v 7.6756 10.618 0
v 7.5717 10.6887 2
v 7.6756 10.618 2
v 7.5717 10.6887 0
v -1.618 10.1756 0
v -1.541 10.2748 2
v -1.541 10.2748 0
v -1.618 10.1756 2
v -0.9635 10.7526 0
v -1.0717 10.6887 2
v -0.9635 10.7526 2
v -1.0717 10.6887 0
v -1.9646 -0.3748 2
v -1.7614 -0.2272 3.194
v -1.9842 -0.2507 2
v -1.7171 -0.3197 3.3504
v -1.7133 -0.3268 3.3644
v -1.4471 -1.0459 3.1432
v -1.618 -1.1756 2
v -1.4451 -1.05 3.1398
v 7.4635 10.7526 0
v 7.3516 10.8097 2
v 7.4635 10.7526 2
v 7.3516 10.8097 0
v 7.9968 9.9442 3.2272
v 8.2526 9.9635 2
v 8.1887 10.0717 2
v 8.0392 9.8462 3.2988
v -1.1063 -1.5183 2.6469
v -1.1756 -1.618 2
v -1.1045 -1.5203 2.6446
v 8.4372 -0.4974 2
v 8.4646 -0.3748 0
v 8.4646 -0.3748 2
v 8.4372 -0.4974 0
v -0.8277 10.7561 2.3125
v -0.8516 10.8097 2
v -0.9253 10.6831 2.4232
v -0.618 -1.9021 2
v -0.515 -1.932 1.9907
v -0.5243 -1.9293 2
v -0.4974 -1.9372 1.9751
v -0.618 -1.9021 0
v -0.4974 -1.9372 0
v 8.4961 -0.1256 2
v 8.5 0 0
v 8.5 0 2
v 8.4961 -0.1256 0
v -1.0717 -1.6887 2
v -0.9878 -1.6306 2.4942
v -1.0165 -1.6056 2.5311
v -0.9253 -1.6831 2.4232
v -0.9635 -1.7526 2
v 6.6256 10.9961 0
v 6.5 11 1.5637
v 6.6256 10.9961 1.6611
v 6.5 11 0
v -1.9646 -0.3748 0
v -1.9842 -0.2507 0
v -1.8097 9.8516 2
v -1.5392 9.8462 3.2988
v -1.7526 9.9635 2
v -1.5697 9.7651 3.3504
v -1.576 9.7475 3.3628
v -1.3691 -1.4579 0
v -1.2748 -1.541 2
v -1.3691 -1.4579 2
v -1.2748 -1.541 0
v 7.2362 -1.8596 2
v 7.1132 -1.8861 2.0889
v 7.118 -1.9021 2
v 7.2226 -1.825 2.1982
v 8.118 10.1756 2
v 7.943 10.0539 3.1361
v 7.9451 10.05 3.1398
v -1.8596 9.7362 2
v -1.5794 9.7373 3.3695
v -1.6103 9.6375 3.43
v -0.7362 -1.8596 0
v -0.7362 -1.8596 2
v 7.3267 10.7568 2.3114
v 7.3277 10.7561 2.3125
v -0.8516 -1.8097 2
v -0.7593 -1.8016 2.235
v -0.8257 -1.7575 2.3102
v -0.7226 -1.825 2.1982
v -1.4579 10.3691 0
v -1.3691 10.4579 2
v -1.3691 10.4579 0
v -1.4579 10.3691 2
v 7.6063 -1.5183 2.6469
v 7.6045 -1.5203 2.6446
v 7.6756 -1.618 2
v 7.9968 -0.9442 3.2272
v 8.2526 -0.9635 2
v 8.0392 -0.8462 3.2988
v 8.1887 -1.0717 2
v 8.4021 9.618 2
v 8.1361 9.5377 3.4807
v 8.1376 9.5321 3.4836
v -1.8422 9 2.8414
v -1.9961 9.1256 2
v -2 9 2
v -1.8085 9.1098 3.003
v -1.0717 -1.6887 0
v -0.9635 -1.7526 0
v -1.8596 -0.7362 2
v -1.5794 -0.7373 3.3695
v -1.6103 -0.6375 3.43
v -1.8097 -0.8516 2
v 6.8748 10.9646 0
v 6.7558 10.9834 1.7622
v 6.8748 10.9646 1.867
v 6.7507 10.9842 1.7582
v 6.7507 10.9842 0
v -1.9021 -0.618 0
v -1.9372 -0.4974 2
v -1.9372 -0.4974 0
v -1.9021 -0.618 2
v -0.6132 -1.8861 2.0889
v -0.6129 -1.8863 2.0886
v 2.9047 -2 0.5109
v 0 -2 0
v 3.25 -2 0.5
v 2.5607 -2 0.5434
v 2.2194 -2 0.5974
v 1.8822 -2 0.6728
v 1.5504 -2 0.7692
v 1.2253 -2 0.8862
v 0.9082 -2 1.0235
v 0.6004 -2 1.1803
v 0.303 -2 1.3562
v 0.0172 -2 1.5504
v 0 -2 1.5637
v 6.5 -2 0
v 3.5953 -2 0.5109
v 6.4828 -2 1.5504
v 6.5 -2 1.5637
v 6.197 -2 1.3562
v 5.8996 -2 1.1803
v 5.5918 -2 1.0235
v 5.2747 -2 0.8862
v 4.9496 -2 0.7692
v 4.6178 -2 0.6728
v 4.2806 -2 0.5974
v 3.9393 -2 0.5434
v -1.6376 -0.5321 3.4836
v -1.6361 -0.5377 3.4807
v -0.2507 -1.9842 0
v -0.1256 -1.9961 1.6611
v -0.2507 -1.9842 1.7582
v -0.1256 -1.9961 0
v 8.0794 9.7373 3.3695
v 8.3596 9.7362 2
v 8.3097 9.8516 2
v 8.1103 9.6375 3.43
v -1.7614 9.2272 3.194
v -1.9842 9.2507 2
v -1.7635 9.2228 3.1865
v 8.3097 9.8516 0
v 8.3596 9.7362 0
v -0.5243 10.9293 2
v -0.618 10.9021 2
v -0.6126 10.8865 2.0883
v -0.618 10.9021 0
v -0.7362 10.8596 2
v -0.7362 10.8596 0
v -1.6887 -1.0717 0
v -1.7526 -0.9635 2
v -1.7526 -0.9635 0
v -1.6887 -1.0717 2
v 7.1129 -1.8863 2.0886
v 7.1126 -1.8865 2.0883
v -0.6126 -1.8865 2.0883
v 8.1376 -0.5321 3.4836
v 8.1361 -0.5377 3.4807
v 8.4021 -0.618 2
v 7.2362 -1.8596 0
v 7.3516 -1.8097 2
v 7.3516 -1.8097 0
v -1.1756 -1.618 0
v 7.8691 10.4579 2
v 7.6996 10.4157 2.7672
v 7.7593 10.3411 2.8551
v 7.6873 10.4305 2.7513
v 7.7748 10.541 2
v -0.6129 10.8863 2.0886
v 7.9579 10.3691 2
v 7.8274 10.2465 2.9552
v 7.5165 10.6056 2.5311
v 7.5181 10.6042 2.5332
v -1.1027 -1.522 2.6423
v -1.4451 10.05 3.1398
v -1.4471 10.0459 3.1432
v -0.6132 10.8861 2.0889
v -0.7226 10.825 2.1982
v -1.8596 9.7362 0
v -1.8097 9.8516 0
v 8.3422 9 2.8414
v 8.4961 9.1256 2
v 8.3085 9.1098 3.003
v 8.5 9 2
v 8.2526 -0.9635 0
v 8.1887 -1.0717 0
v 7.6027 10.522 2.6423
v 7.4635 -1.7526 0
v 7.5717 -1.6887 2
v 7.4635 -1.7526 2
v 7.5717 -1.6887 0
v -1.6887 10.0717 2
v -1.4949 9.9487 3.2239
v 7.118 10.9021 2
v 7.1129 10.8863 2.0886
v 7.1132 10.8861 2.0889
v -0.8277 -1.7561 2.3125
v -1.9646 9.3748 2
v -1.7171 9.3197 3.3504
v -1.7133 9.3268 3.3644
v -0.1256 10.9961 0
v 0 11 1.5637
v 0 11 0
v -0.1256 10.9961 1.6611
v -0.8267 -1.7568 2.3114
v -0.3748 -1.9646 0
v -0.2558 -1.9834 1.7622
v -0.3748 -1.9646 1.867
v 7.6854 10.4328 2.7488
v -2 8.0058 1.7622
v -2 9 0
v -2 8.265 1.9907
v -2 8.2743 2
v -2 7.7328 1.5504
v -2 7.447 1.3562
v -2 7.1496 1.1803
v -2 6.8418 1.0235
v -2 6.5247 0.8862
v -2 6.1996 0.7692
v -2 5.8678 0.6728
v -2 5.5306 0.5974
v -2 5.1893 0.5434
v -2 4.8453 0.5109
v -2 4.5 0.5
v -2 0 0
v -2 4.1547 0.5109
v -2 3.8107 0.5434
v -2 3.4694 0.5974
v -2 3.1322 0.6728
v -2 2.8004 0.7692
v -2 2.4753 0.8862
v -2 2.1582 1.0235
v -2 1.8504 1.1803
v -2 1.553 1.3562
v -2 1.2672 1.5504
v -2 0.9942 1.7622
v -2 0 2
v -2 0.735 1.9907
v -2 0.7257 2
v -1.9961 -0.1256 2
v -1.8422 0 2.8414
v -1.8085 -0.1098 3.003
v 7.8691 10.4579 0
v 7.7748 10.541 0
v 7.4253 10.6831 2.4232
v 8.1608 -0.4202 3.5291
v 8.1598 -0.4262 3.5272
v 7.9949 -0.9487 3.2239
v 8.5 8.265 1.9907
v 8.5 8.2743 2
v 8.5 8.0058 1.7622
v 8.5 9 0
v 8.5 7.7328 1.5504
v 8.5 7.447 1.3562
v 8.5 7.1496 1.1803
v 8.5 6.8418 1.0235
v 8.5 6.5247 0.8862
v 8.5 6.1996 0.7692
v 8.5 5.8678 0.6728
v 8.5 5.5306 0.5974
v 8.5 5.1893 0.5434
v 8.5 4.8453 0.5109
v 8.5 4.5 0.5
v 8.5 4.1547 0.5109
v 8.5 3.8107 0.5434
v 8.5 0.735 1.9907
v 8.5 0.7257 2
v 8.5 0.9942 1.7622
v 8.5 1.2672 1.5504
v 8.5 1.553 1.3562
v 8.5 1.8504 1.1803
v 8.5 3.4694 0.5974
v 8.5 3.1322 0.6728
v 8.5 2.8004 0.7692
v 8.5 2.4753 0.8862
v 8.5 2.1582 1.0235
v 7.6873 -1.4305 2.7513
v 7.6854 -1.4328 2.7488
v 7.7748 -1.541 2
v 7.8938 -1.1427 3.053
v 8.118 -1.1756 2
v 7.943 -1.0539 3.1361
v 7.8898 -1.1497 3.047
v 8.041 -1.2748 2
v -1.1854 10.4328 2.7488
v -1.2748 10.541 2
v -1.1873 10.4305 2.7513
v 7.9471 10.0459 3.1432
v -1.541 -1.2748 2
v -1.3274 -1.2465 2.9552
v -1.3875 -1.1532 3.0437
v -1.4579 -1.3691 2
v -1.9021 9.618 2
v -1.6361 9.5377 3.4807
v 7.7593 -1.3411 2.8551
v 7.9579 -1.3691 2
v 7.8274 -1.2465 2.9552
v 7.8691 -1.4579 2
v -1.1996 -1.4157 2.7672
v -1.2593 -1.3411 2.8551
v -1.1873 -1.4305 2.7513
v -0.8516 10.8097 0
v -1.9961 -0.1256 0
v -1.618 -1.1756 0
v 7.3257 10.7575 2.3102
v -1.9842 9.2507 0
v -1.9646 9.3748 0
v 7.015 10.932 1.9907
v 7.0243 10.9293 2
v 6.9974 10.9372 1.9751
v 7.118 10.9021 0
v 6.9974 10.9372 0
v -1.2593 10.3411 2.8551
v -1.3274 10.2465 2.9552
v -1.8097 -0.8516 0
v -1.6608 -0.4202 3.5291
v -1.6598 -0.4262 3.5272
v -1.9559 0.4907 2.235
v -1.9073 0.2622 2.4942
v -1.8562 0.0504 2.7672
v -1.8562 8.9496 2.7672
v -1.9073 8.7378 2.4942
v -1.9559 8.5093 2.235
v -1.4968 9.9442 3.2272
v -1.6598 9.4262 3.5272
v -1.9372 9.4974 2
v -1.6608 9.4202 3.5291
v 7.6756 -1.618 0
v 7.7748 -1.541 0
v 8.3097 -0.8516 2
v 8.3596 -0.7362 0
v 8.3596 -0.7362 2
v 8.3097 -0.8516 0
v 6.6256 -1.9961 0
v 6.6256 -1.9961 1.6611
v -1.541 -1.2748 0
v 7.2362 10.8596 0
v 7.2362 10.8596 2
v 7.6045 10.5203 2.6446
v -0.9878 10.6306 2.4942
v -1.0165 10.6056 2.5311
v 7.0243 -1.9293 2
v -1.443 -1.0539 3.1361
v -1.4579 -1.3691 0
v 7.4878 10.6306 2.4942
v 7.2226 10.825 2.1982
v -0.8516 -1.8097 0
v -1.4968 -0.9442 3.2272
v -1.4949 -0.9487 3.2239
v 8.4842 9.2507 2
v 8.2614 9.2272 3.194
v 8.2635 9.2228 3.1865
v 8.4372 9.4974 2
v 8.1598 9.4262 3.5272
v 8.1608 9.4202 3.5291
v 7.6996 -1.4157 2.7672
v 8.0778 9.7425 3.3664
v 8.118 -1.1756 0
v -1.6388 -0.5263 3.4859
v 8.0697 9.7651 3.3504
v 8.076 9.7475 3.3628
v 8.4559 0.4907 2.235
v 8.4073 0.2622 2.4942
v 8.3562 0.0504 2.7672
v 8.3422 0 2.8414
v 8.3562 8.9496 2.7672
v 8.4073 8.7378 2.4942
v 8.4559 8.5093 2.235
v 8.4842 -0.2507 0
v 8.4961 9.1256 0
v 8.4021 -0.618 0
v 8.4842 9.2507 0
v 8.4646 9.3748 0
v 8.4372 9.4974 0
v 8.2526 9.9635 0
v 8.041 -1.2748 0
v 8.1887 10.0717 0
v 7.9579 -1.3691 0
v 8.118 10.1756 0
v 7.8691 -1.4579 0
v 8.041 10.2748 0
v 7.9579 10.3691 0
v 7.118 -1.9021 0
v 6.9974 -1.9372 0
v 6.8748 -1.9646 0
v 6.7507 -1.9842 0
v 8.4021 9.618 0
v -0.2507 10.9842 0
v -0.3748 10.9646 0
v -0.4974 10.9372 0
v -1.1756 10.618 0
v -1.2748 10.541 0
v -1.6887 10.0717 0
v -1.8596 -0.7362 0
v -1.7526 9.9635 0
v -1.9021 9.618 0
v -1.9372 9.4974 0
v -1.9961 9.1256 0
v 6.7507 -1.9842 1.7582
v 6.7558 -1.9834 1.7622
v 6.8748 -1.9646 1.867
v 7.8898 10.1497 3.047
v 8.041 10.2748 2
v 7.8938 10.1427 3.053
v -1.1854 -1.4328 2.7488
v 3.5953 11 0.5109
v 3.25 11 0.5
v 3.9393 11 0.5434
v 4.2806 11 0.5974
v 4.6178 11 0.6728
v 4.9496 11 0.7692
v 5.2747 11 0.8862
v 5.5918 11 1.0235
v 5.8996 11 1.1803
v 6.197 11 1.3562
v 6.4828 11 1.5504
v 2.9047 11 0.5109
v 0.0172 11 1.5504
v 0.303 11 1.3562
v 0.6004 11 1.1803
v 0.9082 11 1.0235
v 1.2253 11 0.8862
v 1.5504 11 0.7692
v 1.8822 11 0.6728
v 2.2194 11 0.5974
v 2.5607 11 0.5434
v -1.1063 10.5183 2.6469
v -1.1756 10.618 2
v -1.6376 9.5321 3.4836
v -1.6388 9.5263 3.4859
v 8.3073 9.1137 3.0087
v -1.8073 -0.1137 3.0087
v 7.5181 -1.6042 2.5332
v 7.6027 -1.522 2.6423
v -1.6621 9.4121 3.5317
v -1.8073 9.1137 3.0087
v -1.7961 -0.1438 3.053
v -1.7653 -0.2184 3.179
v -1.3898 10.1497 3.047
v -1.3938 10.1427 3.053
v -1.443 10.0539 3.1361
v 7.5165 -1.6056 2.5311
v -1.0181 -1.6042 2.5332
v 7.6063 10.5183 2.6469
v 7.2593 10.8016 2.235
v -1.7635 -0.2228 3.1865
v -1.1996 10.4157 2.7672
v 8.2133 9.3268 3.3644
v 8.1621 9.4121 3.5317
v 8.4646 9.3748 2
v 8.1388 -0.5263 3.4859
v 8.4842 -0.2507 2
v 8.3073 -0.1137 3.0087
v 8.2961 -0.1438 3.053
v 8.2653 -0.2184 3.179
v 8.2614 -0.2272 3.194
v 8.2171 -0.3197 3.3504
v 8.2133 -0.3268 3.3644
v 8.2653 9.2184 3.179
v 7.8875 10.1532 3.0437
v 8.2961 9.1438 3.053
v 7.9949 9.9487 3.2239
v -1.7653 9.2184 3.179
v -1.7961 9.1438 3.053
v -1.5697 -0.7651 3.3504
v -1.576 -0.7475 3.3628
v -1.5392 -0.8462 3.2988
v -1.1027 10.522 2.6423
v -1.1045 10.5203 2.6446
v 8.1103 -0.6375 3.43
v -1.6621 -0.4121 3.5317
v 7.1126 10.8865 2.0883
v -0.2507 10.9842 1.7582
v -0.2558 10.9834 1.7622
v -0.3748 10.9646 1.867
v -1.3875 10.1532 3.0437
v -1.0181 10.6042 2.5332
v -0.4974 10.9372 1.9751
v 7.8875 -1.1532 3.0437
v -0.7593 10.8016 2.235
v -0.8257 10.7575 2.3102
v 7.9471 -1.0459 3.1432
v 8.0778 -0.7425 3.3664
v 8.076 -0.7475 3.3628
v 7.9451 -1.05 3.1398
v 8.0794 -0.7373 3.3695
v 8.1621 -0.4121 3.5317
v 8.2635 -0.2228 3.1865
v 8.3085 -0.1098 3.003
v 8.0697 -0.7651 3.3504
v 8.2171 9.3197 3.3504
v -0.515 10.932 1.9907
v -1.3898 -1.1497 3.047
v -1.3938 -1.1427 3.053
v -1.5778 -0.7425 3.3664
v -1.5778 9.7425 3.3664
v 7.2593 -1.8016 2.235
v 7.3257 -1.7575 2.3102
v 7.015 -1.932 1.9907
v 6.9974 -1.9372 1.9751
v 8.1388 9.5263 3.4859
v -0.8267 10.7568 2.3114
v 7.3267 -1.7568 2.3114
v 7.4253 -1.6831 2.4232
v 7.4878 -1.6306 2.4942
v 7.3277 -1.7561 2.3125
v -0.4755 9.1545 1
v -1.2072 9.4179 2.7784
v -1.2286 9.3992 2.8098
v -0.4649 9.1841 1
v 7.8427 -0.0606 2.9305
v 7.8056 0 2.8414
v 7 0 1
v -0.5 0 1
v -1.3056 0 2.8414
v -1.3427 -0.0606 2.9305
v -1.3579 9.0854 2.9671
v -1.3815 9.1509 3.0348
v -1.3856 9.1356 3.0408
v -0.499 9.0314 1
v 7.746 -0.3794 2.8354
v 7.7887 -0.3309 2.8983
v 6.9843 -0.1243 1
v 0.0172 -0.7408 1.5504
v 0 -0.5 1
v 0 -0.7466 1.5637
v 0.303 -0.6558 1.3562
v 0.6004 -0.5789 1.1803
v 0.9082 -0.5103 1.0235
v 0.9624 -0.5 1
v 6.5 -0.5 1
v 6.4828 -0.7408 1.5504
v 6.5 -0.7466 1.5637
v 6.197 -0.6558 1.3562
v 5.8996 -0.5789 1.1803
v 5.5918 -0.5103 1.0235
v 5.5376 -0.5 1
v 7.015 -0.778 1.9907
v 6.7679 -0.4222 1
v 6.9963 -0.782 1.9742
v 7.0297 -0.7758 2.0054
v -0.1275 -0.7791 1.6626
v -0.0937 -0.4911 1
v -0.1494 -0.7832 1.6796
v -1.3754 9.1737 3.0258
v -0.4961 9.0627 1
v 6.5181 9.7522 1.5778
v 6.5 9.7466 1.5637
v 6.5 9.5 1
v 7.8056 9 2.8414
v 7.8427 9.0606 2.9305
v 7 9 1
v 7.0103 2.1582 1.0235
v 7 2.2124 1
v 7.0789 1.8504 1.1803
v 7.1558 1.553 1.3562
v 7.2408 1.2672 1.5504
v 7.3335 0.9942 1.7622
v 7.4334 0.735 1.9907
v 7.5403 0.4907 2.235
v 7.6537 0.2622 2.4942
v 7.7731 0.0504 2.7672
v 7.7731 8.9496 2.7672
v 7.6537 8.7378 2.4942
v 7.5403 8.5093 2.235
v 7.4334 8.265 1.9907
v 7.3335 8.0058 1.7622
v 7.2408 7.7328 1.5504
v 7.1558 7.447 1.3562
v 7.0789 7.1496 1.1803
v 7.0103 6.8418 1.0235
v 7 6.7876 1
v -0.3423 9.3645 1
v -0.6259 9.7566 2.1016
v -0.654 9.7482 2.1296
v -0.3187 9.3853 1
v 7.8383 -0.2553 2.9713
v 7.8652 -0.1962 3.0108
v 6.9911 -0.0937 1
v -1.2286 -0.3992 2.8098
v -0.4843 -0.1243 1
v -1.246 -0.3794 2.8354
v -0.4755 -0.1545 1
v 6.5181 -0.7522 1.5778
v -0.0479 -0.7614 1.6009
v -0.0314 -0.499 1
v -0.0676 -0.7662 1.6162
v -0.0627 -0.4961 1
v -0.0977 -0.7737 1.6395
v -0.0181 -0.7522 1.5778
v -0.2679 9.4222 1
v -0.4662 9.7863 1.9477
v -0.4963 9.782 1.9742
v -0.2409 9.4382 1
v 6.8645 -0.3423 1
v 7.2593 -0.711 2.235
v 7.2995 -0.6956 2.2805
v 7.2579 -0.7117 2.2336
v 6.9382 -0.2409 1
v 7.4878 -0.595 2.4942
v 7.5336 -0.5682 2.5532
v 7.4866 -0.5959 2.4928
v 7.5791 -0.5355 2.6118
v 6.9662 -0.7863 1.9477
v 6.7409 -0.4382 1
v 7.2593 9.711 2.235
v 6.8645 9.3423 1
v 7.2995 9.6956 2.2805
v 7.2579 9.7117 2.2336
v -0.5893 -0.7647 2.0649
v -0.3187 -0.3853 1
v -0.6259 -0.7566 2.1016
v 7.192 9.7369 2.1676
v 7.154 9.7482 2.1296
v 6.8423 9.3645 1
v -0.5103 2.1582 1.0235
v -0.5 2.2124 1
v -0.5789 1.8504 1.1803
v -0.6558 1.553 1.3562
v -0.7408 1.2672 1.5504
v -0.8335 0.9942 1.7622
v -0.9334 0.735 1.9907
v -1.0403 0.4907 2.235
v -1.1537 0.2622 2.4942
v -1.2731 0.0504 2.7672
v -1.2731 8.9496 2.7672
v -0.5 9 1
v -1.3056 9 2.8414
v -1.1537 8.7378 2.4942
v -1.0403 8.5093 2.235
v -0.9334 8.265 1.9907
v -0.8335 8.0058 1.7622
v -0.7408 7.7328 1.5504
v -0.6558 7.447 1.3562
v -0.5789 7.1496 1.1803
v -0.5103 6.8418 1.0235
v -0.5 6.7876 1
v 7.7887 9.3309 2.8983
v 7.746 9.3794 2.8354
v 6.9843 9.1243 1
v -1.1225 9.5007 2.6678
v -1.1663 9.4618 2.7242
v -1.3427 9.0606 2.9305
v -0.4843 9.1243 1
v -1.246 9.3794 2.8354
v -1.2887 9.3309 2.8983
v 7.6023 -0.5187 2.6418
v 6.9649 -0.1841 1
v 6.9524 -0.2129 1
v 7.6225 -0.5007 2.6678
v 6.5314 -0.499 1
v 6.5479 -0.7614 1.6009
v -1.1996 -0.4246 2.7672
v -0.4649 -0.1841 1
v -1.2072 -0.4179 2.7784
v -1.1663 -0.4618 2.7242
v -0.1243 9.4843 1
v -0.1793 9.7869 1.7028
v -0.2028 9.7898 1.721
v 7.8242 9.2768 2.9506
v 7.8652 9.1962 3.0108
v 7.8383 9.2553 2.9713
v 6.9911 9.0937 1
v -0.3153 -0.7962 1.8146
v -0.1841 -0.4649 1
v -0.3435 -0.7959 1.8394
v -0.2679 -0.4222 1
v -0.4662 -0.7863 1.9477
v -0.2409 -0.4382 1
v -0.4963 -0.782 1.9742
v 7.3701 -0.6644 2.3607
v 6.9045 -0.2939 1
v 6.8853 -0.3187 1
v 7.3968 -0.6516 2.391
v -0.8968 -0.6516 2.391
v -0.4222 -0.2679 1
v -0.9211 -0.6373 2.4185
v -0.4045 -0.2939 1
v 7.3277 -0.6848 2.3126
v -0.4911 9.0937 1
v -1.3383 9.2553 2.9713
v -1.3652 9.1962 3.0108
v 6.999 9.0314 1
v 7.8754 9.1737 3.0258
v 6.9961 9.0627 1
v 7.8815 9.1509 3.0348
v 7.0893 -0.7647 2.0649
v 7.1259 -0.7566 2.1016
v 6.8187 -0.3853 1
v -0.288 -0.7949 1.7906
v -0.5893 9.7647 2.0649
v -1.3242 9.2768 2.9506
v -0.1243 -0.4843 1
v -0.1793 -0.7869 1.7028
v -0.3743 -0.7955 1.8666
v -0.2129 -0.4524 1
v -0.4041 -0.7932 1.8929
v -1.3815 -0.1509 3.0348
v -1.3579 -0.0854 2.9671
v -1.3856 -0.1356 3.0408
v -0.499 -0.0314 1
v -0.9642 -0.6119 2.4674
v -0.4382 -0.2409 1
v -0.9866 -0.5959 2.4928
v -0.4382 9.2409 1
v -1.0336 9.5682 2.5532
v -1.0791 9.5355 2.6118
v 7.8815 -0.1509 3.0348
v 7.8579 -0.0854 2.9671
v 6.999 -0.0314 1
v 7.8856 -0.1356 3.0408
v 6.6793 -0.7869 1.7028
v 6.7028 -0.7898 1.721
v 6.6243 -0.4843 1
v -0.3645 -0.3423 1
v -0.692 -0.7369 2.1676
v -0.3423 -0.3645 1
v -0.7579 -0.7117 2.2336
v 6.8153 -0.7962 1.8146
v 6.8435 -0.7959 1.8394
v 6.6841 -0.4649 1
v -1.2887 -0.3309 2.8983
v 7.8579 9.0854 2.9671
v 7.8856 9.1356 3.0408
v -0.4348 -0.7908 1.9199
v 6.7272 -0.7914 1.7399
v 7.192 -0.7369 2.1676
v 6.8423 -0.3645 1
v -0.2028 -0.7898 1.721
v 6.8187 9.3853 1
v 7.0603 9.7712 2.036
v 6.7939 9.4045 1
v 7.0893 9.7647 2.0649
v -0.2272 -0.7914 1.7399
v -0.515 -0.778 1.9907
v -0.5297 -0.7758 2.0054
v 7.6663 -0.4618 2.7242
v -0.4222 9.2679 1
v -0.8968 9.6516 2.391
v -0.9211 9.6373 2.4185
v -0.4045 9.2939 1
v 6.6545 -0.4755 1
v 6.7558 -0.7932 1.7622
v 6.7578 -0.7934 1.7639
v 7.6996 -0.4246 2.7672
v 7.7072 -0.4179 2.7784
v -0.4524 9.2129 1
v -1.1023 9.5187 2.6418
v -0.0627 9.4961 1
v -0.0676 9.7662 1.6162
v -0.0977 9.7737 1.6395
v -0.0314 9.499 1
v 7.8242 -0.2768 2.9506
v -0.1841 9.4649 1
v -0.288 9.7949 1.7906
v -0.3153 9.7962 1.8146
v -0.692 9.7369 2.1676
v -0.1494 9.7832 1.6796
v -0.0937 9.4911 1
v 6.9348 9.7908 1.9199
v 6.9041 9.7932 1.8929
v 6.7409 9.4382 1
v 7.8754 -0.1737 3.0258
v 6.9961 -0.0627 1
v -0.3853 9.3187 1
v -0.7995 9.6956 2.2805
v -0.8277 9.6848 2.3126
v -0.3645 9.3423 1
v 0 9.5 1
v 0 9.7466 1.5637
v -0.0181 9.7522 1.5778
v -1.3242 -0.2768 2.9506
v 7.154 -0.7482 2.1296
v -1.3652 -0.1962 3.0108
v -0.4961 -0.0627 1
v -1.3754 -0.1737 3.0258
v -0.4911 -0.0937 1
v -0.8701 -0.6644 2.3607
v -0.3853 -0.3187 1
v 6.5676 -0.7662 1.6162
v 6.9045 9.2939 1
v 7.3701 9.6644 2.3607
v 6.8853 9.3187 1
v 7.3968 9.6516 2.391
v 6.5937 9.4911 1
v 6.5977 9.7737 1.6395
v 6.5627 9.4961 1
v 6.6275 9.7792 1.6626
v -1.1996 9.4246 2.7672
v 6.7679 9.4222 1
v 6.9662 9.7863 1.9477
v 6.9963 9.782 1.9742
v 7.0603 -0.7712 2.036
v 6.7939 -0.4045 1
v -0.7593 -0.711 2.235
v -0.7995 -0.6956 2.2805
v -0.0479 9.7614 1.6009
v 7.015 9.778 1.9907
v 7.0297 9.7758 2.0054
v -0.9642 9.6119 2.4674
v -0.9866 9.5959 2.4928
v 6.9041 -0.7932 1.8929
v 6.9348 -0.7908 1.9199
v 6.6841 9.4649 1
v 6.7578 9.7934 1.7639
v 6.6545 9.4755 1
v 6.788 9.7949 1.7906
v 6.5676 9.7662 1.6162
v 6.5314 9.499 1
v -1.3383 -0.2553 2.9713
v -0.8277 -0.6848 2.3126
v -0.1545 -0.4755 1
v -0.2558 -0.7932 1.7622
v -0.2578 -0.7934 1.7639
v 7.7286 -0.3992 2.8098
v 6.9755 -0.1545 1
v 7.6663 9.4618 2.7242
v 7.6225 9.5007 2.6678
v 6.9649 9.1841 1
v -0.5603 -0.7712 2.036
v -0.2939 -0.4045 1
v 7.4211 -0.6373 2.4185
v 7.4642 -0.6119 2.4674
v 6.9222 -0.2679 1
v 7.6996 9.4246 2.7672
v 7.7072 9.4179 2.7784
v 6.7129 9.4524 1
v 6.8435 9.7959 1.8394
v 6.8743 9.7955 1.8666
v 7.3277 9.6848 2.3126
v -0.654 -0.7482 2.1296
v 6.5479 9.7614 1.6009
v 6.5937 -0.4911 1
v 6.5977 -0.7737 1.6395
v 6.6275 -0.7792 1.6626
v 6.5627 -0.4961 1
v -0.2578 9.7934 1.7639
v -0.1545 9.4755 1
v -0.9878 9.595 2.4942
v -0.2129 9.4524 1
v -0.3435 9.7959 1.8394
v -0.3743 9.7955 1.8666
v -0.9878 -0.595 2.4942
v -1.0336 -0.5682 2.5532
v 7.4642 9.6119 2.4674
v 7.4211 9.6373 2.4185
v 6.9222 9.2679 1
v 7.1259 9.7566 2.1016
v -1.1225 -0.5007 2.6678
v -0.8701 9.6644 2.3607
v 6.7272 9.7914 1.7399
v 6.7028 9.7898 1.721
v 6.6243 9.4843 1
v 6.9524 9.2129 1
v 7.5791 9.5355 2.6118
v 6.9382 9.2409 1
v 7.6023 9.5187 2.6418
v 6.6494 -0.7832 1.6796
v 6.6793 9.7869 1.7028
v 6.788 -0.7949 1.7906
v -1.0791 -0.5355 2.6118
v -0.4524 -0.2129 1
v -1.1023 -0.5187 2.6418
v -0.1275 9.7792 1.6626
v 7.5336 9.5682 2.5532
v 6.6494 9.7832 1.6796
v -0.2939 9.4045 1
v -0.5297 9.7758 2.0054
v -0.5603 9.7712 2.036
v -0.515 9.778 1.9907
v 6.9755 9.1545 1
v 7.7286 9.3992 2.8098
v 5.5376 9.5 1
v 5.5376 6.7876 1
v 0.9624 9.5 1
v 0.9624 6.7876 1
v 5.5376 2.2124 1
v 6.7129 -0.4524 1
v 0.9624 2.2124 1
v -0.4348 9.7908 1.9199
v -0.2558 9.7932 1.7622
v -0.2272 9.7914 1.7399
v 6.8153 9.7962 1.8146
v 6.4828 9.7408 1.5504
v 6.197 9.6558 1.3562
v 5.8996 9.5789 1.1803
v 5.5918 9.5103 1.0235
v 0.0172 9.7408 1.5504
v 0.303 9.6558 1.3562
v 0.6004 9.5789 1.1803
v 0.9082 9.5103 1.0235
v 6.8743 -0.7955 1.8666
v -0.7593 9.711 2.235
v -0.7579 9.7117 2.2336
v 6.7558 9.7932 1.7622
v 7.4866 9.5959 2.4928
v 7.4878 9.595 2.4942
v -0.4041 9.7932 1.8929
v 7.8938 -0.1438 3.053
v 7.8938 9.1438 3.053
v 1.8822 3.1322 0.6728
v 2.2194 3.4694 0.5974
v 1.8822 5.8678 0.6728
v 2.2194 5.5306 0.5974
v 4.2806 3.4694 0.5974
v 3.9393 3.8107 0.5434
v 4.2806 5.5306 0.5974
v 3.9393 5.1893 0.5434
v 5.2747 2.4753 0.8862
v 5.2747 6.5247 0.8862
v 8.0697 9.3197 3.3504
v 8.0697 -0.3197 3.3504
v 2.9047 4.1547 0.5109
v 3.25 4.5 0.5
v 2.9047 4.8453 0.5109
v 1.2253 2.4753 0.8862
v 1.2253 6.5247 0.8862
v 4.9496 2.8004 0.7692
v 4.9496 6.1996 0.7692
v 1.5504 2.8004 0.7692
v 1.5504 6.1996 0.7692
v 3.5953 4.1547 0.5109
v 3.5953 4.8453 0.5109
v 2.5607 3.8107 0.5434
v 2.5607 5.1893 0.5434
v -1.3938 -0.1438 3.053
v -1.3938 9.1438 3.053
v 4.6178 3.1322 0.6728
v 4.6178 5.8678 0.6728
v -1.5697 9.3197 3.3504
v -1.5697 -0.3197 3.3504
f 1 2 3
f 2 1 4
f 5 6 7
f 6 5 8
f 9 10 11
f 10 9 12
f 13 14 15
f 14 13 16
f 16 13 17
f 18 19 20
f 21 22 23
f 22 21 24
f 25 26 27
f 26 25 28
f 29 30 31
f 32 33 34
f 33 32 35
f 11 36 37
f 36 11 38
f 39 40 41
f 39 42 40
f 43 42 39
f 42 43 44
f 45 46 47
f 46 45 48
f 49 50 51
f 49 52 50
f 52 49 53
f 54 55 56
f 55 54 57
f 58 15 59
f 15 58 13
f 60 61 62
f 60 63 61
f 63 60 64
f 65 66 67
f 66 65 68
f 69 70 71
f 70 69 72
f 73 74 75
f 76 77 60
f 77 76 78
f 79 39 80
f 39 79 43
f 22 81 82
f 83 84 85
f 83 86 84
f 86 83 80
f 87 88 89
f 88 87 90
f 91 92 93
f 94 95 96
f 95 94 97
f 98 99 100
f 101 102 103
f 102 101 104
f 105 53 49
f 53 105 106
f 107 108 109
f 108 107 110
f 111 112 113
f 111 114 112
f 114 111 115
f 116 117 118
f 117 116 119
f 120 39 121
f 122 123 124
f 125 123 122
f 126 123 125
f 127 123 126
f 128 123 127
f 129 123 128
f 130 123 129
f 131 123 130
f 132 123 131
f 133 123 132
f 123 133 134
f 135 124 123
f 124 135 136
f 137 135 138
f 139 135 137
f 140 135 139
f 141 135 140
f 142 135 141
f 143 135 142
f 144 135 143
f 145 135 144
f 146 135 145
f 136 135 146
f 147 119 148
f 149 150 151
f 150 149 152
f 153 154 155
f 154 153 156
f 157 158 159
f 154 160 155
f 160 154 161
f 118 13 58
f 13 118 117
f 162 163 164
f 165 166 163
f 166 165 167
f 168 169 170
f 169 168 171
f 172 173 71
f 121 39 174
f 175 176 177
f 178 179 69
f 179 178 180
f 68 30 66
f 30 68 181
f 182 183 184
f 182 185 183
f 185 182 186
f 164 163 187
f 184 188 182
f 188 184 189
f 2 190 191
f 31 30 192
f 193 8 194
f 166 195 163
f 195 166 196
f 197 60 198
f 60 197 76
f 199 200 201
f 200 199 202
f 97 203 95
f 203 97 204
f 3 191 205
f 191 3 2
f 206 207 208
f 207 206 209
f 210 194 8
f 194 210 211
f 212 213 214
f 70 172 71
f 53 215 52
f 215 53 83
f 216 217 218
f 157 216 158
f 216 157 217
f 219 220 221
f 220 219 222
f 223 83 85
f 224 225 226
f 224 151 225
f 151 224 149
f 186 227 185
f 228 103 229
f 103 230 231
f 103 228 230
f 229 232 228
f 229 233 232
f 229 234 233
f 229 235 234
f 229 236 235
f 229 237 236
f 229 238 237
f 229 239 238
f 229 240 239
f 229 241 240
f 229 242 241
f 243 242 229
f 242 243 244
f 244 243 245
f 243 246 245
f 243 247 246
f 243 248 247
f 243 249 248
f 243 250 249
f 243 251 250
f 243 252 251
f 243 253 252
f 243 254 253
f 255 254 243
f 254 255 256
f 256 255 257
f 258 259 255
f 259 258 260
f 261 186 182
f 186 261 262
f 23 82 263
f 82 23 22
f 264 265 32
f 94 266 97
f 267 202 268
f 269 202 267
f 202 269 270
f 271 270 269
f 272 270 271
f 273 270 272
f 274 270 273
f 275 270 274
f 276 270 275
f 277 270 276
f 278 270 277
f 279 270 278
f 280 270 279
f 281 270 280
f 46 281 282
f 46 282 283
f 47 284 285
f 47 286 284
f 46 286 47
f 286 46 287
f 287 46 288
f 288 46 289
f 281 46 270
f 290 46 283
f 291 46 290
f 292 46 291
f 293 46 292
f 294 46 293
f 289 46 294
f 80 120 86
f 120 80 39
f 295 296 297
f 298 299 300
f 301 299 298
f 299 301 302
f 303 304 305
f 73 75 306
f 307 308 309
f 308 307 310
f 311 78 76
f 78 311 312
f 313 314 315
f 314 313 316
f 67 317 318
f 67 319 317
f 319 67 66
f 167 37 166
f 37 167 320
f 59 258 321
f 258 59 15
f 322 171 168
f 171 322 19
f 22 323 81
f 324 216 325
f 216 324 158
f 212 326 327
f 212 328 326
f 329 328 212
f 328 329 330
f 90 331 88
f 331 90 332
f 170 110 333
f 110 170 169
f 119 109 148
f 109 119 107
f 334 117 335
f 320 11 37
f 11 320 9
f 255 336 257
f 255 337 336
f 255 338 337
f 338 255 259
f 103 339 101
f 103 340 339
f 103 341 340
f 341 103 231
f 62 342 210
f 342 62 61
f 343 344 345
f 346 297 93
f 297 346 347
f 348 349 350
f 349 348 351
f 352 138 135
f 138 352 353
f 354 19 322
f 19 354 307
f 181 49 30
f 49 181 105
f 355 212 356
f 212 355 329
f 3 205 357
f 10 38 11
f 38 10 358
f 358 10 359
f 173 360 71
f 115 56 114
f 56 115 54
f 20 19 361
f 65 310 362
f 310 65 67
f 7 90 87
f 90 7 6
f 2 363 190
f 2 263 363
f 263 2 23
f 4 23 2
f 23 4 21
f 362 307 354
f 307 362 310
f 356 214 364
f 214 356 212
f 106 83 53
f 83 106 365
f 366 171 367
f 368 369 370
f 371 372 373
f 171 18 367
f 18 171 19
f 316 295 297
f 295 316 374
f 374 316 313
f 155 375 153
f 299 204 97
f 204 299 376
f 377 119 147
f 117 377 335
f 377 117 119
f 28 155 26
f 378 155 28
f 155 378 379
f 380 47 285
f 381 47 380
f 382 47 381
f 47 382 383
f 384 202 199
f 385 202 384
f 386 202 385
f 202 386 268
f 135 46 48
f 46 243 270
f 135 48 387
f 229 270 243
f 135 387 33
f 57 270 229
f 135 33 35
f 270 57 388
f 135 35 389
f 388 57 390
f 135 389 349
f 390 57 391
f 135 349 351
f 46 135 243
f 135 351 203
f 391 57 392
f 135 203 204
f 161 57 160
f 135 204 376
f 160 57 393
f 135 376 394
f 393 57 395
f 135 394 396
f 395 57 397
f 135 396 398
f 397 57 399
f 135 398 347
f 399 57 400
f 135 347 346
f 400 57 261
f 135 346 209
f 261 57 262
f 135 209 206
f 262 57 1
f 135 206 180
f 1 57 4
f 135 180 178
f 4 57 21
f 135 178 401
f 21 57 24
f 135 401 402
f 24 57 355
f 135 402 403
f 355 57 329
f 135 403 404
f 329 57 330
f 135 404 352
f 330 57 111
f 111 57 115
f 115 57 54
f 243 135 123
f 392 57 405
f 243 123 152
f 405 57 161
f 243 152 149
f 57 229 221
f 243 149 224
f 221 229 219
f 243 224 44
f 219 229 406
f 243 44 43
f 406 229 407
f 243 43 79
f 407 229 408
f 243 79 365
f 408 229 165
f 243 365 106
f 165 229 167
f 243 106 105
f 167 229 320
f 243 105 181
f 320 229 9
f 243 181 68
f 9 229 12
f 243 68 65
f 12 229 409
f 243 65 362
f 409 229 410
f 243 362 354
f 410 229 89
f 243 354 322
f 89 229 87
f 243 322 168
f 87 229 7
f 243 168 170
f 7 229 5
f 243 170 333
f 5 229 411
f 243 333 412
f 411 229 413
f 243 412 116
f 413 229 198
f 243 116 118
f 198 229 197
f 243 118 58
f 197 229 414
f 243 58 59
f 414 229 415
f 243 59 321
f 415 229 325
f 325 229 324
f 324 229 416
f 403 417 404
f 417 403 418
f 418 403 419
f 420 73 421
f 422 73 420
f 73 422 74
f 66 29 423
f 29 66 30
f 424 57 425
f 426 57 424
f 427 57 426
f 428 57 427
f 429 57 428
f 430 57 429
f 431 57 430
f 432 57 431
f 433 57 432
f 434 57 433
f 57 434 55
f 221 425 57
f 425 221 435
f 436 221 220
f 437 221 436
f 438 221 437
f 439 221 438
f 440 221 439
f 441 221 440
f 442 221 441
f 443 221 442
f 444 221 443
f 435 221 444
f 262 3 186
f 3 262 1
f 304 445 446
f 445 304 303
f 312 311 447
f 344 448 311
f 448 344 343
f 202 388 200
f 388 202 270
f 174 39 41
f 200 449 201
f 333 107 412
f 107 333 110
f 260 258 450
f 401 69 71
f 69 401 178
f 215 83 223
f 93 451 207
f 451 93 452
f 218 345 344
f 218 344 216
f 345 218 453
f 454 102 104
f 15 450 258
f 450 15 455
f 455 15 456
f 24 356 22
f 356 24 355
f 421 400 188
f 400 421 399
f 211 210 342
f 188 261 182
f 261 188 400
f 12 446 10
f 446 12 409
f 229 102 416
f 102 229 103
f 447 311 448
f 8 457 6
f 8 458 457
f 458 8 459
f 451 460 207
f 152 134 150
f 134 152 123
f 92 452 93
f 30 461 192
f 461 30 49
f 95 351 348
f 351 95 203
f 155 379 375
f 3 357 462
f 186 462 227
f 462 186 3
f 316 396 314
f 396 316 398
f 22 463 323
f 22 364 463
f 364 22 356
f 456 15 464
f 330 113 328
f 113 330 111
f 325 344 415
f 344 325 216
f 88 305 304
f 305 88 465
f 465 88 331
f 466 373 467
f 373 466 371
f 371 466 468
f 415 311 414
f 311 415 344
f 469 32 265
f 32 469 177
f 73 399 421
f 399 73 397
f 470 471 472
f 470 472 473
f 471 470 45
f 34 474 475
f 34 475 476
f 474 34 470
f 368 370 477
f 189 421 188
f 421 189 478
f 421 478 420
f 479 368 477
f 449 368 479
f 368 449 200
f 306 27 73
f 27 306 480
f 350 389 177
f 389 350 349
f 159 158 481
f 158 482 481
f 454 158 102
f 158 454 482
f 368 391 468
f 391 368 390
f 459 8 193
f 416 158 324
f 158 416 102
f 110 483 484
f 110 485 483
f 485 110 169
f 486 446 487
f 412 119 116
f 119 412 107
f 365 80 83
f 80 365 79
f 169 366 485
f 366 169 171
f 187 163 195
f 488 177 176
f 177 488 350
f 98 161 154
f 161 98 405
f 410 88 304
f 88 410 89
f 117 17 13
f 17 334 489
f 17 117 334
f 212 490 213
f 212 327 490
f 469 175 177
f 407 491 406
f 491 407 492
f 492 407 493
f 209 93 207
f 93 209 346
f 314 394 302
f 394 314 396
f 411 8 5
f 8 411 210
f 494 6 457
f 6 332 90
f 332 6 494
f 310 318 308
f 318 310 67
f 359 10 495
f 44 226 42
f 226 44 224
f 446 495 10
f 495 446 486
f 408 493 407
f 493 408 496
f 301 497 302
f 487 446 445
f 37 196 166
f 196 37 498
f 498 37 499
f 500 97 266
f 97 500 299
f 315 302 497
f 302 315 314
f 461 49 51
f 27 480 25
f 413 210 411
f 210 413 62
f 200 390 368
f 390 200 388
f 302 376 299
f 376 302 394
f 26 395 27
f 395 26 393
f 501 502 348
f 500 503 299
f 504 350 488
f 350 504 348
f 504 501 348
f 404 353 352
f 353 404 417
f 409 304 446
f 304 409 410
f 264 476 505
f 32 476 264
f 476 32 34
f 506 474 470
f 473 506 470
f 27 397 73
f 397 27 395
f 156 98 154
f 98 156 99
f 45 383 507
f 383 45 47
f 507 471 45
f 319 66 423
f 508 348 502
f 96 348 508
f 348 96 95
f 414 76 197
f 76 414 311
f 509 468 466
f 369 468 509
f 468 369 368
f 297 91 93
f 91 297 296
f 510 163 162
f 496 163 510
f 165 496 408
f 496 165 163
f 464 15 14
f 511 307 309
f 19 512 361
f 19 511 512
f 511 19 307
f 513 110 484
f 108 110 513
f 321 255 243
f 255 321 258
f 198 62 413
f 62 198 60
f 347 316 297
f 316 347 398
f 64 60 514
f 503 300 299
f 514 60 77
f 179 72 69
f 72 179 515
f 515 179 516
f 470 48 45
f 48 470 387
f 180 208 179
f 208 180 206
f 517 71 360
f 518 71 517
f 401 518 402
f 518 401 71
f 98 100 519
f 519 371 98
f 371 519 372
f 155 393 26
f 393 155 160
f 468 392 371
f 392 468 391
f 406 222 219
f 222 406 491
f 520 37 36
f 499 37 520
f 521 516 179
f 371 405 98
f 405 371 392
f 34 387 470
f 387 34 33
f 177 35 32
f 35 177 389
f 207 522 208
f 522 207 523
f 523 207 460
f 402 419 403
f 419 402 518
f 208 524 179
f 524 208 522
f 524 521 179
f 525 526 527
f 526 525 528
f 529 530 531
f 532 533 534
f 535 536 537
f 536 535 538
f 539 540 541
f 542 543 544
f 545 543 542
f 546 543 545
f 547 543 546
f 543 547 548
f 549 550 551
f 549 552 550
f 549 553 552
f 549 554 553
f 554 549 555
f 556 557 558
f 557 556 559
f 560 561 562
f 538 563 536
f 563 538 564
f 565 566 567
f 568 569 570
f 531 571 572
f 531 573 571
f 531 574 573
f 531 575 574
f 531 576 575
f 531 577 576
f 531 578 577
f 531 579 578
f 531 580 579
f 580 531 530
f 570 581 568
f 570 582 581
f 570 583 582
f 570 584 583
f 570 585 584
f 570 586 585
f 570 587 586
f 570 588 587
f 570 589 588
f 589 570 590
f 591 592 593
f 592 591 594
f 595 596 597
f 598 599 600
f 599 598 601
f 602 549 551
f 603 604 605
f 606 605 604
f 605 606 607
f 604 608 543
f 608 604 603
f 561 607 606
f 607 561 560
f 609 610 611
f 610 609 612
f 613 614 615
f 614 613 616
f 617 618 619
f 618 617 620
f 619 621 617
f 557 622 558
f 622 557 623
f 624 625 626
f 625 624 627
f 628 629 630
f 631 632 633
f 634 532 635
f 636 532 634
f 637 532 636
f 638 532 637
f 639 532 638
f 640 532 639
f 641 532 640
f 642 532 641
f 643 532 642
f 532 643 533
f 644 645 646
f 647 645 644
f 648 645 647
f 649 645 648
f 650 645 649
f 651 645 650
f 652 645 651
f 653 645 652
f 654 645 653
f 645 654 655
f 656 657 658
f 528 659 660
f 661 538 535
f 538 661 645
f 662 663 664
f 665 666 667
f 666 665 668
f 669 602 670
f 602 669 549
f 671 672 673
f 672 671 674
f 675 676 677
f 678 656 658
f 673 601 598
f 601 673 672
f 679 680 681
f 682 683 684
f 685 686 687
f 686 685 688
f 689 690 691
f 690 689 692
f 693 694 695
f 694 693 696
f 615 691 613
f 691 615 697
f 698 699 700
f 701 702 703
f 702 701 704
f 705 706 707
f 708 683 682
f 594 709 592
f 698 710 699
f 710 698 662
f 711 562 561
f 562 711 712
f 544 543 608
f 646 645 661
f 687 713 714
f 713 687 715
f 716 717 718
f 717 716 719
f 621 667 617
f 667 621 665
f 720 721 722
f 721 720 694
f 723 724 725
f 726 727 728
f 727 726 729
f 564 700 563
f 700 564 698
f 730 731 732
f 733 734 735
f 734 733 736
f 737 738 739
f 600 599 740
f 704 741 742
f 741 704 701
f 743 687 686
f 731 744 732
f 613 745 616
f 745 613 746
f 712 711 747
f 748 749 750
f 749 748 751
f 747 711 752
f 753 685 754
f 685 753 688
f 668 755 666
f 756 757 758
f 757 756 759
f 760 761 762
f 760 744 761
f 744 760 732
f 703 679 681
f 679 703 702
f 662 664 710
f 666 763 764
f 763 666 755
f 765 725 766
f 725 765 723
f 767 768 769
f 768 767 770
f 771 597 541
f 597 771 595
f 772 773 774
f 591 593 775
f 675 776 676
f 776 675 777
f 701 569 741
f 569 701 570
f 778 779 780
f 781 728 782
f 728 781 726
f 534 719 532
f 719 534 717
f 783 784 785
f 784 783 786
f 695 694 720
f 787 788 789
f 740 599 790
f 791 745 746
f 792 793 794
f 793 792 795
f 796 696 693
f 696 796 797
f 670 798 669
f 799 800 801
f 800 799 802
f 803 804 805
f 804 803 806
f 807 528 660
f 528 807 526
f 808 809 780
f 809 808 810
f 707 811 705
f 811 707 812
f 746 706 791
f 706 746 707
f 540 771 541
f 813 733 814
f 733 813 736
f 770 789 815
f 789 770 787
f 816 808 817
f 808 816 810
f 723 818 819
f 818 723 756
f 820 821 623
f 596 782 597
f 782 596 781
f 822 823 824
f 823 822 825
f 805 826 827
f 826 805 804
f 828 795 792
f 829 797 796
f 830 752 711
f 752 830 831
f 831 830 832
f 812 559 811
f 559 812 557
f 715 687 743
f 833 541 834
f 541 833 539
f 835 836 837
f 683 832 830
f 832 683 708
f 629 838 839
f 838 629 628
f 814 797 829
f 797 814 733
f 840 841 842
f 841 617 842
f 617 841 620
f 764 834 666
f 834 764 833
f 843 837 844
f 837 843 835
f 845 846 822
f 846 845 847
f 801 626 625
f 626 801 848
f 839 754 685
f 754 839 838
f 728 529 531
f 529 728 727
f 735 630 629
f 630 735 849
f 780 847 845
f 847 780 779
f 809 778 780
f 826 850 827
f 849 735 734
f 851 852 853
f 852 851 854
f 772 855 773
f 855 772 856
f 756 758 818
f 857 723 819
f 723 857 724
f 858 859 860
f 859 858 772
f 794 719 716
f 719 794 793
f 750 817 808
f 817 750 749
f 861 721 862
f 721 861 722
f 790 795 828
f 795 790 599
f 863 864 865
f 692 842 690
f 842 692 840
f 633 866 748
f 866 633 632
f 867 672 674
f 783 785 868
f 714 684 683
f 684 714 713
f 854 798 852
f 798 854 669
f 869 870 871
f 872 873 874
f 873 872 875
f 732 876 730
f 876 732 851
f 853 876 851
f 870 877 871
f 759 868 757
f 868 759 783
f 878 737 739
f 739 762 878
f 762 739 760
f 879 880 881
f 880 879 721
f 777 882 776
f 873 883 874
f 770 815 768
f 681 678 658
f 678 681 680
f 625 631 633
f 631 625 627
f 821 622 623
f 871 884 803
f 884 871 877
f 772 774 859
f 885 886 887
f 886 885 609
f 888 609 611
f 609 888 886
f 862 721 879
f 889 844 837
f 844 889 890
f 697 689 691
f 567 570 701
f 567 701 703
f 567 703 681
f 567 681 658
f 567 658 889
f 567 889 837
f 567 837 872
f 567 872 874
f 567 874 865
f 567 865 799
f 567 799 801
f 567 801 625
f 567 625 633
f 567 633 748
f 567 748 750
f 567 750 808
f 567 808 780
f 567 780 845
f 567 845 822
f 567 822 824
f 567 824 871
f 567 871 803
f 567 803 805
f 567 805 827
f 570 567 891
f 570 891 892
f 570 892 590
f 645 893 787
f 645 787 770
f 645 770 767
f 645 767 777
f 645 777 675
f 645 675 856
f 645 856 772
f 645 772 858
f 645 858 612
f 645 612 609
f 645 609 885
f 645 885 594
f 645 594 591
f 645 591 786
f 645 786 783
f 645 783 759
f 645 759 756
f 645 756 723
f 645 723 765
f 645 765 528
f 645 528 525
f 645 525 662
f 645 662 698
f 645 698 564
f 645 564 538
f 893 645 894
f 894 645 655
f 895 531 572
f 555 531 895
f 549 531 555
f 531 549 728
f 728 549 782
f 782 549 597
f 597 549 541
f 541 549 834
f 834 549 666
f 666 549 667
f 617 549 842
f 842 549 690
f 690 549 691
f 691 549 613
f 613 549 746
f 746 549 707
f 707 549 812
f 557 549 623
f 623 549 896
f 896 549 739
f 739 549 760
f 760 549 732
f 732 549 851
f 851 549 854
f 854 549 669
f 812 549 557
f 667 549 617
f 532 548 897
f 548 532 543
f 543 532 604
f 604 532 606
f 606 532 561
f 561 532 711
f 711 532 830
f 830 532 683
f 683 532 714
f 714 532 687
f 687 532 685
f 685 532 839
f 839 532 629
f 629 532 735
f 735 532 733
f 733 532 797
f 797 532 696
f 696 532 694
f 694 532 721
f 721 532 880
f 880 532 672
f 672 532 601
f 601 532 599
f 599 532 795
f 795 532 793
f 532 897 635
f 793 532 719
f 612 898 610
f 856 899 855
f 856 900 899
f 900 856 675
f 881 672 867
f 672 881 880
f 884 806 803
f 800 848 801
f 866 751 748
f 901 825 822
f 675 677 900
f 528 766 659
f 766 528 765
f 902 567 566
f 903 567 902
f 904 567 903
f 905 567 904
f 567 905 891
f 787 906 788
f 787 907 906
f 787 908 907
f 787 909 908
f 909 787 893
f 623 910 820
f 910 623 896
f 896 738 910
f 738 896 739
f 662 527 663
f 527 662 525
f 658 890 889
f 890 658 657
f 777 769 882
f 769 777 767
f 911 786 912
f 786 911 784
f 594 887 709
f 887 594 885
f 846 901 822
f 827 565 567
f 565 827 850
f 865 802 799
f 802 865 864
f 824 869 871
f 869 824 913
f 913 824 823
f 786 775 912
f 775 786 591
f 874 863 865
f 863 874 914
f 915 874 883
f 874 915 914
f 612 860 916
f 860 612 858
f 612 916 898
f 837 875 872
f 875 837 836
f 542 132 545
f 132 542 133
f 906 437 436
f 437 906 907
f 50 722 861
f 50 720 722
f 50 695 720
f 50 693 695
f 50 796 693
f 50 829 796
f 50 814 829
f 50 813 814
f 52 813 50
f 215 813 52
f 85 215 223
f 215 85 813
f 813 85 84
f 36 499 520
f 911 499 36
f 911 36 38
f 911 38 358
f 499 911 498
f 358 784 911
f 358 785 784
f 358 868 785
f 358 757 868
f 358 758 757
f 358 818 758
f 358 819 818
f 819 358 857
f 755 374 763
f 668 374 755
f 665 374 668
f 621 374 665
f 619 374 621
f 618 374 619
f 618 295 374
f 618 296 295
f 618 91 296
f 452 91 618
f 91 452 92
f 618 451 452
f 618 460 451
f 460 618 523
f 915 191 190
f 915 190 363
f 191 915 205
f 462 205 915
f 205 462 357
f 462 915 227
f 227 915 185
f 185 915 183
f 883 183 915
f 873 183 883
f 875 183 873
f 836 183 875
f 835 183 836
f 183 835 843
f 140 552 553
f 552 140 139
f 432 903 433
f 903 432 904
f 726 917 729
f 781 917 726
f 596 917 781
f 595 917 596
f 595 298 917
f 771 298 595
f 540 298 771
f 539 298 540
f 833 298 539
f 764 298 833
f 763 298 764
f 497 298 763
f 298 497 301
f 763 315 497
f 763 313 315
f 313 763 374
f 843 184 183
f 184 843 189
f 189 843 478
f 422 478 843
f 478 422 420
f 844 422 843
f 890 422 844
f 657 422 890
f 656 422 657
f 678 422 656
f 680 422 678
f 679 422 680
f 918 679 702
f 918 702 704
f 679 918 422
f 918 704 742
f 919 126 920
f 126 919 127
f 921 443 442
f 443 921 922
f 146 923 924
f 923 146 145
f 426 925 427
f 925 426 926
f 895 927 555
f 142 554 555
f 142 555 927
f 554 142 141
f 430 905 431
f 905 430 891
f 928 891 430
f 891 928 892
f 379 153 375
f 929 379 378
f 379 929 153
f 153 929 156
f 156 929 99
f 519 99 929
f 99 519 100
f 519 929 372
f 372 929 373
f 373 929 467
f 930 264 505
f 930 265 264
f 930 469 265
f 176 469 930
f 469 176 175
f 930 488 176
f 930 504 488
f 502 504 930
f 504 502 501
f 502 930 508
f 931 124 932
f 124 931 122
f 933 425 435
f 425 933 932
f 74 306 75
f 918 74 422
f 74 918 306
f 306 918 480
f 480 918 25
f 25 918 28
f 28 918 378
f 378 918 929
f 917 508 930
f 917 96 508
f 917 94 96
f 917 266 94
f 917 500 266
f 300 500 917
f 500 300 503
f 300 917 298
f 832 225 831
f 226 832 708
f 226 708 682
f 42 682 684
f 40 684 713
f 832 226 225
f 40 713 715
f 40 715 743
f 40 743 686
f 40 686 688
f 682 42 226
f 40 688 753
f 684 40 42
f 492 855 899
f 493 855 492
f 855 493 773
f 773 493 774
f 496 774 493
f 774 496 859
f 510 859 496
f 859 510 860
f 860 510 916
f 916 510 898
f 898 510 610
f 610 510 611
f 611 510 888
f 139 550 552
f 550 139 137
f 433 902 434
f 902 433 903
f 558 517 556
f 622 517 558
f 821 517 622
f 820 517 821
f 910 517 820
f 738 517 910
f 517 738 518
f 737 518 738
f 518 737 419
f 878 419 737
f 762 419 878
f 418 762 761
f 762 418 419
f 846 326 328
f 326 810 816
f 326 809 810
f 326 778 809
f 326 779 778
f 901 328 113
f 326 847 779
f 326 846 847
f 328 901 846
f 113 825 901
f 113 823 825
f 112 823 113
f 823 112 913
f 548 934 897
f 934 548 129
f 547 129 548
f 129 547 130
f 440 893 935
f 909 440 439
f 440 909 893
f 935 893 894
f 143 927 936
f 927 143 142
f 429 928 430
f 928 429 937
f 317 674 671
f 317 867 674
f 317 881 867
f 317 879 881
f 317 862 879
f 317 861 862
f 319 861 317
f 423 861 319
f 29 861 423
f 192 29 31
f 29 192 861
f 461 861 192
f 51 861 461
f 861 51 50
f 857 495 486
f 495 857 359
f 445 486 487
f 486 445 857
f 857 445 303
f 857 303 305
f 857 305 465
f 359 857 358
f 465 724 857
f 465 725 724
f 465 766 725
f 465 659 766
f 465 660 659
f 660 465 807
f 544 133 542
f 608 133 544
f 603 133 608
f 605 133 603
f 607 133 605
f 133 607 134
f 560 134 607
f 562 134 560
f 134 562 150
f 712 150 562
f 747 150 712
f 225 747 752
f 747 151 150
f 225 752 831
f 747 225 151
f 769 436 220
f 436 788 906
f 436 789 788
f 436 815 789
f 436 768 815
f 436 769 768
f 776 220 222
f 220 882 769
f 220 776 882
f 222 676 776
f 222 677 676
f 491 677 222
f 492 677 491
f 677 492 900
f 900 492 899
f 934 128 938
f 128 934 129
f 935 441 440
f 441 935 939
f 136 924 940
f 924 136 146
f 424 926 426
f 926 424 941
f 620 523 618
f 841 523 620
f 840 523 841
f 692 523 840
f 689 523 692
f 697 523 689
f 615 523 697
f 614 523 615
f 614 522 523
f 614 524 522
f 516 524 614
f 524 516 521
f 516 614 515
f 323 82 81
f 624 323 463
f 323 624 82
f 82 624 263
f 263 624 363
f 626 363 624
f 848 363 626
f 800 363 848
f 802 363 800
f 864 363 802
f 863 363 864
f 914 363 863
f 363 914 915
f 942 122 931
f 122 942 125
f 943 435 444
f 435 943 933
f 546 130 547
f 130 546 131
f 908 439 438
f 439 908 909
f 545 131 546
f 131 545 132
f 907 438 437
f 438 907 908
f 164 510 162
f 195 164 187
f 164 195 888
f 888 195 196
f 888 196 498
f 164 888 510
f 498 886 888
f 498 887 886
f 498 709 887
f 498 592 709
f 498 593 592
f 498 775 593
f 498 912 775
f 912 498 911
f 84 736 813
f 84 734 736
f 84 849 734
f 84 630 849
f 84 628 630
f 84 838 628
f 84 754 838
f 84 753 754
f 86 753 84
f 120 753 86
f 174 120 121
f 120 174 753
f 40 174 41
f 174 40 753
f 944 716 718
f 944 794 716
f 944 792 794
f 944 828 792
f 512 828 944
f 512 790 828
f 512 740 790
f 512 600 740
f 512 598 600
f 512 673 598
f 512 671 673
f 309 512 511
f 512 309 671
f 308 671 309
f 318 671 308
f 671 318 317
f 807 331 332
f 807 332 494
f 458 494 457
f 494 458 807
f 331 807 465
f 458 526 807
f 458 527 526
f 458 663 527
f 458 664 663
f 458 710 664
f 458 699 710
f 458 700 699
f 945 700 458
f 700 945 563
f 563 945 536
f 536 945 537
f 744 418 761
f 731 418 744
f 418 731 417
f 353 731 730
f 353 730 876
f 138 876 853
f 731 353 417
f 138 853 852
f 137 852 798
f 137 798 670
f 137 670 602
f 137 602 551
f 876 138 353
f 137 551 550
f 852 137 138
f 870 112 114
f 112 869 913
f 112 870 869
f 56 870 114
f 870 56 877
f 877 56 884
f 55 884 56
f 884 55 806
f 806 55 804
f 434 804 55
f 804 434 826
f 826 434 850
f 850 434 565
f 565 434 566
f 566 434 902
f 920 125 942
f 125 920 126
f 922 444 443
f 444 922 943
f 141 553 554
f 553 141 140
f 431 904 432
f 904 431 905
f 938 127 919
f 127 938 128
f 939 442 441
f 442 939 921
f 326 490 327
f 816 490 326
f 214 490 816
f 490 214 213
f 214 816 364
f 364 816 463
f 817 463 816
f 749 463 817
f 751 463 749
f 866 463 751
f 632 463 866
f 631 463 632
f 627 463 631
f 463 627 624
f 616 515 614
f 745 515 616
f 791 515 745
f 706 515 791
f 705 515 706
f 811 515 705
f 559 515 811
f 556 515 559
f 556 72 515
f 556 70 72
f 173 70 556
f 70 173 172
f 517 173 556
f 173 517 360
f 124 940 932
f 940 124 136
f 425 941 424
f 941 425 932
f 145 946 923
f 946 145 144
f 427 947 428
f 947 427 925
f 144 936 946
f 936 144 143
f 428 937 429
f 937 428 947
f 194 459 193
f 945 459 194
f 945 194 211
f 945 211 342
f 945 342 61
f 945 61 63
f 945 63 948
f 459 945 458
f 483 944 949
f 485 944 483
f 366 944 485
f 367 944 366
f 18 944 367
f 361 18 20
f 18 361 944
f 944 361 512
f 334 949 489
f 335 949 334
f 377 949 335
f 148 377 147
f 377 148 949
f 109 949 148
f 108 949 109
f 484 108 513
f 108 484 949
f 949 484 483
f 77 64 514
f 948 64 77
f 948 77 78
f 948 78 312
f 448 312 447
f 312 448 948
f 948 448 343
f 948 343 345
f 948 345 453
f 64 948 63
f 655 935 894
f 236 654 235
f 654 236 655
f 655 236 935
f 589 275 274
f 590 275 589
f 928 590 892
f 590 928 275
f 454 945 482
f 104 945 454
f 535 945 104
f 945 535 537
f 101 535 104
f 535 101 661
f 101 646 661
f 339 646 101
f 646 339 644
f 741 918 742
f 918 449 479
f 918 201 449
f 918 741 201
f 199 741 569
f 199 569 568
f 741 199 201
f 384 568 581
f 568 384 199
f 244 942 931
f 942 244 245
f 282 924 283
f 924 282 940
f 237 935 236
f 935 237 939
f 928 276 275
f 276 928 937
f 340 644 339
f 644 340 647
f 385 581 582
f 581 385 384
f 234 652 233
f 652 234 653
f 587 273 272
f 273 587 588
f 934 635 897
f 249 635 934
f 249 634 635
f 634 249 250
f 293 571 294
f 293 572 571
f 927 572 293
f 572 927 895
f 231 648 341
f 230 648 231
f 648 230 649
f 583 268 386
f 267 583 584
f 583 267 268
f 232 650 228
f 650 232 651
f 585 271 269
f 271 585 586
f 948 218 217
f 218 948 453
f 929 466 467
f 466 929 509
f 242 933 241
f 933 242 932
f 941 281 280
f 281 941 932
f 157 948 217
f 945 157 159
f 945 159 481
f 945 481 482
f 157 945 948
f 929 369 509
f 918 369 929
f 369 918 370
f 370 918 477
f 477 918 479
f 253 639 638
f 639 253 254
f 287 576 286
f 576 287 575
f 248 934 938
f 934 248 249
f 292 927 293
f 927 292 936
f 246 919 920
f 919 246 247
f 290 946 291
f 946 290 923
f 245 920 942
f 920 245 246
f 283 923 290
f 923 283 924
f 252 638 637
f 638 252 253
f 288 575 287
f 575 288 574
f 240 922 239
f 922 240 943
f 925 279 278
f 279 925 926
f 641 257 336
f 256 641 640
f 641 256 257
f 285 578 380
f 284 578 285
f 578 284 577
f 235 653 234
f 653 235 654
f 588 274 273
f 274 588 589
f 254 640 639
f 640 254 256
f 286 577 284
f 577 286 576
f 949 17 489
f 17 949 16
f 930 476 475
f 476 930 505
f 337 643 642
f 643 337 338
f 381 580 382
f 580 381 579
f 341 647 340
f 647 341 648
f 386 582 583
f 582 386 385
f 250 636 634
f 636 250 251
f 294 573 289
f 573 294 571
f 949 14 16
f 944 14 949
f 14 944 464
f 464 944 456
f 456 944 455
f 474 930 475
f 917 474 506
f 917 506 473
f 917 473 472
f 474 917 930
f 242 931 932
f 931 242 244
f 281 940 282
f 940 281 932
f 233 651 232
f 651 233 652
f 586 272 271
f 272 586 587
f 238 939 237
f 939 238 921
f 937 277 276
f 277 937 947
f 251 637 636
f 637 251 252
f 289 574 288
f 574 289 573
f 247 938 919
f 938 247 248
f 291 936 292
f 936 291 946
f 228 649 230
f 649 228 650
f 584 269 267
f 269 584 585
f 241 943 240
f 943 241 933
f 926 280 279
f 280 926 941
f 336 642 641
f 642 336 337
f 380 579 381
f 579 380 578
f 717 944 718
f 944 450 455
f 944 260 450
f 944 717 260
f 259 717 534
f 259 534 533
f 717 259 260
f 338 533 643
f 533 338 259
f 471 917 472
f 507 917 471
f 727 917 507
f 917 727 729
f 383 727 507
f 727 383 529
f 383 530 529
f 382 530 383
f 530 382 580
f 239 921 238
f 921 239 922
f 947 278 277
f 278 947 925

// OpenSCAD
$fn=100;
difference(){
difference(){
difference(){
minkowski(){
cube([6.5,9,2]);
cylinder(8,d1=4,d2=1);
}
translate([0,0,1]){

minkowski(){
cube([6.5,9,2]);
cylinder(8,d1=1,d2=8);
}
}
}

translate([3.25,-4,6]){
rotate([270,0,0]){
cylinder(32,d=11);
}}

}

translate([10,4.5,6]){
rotate([270,0,90]){
cylinder(32,d=11);
}}

}
